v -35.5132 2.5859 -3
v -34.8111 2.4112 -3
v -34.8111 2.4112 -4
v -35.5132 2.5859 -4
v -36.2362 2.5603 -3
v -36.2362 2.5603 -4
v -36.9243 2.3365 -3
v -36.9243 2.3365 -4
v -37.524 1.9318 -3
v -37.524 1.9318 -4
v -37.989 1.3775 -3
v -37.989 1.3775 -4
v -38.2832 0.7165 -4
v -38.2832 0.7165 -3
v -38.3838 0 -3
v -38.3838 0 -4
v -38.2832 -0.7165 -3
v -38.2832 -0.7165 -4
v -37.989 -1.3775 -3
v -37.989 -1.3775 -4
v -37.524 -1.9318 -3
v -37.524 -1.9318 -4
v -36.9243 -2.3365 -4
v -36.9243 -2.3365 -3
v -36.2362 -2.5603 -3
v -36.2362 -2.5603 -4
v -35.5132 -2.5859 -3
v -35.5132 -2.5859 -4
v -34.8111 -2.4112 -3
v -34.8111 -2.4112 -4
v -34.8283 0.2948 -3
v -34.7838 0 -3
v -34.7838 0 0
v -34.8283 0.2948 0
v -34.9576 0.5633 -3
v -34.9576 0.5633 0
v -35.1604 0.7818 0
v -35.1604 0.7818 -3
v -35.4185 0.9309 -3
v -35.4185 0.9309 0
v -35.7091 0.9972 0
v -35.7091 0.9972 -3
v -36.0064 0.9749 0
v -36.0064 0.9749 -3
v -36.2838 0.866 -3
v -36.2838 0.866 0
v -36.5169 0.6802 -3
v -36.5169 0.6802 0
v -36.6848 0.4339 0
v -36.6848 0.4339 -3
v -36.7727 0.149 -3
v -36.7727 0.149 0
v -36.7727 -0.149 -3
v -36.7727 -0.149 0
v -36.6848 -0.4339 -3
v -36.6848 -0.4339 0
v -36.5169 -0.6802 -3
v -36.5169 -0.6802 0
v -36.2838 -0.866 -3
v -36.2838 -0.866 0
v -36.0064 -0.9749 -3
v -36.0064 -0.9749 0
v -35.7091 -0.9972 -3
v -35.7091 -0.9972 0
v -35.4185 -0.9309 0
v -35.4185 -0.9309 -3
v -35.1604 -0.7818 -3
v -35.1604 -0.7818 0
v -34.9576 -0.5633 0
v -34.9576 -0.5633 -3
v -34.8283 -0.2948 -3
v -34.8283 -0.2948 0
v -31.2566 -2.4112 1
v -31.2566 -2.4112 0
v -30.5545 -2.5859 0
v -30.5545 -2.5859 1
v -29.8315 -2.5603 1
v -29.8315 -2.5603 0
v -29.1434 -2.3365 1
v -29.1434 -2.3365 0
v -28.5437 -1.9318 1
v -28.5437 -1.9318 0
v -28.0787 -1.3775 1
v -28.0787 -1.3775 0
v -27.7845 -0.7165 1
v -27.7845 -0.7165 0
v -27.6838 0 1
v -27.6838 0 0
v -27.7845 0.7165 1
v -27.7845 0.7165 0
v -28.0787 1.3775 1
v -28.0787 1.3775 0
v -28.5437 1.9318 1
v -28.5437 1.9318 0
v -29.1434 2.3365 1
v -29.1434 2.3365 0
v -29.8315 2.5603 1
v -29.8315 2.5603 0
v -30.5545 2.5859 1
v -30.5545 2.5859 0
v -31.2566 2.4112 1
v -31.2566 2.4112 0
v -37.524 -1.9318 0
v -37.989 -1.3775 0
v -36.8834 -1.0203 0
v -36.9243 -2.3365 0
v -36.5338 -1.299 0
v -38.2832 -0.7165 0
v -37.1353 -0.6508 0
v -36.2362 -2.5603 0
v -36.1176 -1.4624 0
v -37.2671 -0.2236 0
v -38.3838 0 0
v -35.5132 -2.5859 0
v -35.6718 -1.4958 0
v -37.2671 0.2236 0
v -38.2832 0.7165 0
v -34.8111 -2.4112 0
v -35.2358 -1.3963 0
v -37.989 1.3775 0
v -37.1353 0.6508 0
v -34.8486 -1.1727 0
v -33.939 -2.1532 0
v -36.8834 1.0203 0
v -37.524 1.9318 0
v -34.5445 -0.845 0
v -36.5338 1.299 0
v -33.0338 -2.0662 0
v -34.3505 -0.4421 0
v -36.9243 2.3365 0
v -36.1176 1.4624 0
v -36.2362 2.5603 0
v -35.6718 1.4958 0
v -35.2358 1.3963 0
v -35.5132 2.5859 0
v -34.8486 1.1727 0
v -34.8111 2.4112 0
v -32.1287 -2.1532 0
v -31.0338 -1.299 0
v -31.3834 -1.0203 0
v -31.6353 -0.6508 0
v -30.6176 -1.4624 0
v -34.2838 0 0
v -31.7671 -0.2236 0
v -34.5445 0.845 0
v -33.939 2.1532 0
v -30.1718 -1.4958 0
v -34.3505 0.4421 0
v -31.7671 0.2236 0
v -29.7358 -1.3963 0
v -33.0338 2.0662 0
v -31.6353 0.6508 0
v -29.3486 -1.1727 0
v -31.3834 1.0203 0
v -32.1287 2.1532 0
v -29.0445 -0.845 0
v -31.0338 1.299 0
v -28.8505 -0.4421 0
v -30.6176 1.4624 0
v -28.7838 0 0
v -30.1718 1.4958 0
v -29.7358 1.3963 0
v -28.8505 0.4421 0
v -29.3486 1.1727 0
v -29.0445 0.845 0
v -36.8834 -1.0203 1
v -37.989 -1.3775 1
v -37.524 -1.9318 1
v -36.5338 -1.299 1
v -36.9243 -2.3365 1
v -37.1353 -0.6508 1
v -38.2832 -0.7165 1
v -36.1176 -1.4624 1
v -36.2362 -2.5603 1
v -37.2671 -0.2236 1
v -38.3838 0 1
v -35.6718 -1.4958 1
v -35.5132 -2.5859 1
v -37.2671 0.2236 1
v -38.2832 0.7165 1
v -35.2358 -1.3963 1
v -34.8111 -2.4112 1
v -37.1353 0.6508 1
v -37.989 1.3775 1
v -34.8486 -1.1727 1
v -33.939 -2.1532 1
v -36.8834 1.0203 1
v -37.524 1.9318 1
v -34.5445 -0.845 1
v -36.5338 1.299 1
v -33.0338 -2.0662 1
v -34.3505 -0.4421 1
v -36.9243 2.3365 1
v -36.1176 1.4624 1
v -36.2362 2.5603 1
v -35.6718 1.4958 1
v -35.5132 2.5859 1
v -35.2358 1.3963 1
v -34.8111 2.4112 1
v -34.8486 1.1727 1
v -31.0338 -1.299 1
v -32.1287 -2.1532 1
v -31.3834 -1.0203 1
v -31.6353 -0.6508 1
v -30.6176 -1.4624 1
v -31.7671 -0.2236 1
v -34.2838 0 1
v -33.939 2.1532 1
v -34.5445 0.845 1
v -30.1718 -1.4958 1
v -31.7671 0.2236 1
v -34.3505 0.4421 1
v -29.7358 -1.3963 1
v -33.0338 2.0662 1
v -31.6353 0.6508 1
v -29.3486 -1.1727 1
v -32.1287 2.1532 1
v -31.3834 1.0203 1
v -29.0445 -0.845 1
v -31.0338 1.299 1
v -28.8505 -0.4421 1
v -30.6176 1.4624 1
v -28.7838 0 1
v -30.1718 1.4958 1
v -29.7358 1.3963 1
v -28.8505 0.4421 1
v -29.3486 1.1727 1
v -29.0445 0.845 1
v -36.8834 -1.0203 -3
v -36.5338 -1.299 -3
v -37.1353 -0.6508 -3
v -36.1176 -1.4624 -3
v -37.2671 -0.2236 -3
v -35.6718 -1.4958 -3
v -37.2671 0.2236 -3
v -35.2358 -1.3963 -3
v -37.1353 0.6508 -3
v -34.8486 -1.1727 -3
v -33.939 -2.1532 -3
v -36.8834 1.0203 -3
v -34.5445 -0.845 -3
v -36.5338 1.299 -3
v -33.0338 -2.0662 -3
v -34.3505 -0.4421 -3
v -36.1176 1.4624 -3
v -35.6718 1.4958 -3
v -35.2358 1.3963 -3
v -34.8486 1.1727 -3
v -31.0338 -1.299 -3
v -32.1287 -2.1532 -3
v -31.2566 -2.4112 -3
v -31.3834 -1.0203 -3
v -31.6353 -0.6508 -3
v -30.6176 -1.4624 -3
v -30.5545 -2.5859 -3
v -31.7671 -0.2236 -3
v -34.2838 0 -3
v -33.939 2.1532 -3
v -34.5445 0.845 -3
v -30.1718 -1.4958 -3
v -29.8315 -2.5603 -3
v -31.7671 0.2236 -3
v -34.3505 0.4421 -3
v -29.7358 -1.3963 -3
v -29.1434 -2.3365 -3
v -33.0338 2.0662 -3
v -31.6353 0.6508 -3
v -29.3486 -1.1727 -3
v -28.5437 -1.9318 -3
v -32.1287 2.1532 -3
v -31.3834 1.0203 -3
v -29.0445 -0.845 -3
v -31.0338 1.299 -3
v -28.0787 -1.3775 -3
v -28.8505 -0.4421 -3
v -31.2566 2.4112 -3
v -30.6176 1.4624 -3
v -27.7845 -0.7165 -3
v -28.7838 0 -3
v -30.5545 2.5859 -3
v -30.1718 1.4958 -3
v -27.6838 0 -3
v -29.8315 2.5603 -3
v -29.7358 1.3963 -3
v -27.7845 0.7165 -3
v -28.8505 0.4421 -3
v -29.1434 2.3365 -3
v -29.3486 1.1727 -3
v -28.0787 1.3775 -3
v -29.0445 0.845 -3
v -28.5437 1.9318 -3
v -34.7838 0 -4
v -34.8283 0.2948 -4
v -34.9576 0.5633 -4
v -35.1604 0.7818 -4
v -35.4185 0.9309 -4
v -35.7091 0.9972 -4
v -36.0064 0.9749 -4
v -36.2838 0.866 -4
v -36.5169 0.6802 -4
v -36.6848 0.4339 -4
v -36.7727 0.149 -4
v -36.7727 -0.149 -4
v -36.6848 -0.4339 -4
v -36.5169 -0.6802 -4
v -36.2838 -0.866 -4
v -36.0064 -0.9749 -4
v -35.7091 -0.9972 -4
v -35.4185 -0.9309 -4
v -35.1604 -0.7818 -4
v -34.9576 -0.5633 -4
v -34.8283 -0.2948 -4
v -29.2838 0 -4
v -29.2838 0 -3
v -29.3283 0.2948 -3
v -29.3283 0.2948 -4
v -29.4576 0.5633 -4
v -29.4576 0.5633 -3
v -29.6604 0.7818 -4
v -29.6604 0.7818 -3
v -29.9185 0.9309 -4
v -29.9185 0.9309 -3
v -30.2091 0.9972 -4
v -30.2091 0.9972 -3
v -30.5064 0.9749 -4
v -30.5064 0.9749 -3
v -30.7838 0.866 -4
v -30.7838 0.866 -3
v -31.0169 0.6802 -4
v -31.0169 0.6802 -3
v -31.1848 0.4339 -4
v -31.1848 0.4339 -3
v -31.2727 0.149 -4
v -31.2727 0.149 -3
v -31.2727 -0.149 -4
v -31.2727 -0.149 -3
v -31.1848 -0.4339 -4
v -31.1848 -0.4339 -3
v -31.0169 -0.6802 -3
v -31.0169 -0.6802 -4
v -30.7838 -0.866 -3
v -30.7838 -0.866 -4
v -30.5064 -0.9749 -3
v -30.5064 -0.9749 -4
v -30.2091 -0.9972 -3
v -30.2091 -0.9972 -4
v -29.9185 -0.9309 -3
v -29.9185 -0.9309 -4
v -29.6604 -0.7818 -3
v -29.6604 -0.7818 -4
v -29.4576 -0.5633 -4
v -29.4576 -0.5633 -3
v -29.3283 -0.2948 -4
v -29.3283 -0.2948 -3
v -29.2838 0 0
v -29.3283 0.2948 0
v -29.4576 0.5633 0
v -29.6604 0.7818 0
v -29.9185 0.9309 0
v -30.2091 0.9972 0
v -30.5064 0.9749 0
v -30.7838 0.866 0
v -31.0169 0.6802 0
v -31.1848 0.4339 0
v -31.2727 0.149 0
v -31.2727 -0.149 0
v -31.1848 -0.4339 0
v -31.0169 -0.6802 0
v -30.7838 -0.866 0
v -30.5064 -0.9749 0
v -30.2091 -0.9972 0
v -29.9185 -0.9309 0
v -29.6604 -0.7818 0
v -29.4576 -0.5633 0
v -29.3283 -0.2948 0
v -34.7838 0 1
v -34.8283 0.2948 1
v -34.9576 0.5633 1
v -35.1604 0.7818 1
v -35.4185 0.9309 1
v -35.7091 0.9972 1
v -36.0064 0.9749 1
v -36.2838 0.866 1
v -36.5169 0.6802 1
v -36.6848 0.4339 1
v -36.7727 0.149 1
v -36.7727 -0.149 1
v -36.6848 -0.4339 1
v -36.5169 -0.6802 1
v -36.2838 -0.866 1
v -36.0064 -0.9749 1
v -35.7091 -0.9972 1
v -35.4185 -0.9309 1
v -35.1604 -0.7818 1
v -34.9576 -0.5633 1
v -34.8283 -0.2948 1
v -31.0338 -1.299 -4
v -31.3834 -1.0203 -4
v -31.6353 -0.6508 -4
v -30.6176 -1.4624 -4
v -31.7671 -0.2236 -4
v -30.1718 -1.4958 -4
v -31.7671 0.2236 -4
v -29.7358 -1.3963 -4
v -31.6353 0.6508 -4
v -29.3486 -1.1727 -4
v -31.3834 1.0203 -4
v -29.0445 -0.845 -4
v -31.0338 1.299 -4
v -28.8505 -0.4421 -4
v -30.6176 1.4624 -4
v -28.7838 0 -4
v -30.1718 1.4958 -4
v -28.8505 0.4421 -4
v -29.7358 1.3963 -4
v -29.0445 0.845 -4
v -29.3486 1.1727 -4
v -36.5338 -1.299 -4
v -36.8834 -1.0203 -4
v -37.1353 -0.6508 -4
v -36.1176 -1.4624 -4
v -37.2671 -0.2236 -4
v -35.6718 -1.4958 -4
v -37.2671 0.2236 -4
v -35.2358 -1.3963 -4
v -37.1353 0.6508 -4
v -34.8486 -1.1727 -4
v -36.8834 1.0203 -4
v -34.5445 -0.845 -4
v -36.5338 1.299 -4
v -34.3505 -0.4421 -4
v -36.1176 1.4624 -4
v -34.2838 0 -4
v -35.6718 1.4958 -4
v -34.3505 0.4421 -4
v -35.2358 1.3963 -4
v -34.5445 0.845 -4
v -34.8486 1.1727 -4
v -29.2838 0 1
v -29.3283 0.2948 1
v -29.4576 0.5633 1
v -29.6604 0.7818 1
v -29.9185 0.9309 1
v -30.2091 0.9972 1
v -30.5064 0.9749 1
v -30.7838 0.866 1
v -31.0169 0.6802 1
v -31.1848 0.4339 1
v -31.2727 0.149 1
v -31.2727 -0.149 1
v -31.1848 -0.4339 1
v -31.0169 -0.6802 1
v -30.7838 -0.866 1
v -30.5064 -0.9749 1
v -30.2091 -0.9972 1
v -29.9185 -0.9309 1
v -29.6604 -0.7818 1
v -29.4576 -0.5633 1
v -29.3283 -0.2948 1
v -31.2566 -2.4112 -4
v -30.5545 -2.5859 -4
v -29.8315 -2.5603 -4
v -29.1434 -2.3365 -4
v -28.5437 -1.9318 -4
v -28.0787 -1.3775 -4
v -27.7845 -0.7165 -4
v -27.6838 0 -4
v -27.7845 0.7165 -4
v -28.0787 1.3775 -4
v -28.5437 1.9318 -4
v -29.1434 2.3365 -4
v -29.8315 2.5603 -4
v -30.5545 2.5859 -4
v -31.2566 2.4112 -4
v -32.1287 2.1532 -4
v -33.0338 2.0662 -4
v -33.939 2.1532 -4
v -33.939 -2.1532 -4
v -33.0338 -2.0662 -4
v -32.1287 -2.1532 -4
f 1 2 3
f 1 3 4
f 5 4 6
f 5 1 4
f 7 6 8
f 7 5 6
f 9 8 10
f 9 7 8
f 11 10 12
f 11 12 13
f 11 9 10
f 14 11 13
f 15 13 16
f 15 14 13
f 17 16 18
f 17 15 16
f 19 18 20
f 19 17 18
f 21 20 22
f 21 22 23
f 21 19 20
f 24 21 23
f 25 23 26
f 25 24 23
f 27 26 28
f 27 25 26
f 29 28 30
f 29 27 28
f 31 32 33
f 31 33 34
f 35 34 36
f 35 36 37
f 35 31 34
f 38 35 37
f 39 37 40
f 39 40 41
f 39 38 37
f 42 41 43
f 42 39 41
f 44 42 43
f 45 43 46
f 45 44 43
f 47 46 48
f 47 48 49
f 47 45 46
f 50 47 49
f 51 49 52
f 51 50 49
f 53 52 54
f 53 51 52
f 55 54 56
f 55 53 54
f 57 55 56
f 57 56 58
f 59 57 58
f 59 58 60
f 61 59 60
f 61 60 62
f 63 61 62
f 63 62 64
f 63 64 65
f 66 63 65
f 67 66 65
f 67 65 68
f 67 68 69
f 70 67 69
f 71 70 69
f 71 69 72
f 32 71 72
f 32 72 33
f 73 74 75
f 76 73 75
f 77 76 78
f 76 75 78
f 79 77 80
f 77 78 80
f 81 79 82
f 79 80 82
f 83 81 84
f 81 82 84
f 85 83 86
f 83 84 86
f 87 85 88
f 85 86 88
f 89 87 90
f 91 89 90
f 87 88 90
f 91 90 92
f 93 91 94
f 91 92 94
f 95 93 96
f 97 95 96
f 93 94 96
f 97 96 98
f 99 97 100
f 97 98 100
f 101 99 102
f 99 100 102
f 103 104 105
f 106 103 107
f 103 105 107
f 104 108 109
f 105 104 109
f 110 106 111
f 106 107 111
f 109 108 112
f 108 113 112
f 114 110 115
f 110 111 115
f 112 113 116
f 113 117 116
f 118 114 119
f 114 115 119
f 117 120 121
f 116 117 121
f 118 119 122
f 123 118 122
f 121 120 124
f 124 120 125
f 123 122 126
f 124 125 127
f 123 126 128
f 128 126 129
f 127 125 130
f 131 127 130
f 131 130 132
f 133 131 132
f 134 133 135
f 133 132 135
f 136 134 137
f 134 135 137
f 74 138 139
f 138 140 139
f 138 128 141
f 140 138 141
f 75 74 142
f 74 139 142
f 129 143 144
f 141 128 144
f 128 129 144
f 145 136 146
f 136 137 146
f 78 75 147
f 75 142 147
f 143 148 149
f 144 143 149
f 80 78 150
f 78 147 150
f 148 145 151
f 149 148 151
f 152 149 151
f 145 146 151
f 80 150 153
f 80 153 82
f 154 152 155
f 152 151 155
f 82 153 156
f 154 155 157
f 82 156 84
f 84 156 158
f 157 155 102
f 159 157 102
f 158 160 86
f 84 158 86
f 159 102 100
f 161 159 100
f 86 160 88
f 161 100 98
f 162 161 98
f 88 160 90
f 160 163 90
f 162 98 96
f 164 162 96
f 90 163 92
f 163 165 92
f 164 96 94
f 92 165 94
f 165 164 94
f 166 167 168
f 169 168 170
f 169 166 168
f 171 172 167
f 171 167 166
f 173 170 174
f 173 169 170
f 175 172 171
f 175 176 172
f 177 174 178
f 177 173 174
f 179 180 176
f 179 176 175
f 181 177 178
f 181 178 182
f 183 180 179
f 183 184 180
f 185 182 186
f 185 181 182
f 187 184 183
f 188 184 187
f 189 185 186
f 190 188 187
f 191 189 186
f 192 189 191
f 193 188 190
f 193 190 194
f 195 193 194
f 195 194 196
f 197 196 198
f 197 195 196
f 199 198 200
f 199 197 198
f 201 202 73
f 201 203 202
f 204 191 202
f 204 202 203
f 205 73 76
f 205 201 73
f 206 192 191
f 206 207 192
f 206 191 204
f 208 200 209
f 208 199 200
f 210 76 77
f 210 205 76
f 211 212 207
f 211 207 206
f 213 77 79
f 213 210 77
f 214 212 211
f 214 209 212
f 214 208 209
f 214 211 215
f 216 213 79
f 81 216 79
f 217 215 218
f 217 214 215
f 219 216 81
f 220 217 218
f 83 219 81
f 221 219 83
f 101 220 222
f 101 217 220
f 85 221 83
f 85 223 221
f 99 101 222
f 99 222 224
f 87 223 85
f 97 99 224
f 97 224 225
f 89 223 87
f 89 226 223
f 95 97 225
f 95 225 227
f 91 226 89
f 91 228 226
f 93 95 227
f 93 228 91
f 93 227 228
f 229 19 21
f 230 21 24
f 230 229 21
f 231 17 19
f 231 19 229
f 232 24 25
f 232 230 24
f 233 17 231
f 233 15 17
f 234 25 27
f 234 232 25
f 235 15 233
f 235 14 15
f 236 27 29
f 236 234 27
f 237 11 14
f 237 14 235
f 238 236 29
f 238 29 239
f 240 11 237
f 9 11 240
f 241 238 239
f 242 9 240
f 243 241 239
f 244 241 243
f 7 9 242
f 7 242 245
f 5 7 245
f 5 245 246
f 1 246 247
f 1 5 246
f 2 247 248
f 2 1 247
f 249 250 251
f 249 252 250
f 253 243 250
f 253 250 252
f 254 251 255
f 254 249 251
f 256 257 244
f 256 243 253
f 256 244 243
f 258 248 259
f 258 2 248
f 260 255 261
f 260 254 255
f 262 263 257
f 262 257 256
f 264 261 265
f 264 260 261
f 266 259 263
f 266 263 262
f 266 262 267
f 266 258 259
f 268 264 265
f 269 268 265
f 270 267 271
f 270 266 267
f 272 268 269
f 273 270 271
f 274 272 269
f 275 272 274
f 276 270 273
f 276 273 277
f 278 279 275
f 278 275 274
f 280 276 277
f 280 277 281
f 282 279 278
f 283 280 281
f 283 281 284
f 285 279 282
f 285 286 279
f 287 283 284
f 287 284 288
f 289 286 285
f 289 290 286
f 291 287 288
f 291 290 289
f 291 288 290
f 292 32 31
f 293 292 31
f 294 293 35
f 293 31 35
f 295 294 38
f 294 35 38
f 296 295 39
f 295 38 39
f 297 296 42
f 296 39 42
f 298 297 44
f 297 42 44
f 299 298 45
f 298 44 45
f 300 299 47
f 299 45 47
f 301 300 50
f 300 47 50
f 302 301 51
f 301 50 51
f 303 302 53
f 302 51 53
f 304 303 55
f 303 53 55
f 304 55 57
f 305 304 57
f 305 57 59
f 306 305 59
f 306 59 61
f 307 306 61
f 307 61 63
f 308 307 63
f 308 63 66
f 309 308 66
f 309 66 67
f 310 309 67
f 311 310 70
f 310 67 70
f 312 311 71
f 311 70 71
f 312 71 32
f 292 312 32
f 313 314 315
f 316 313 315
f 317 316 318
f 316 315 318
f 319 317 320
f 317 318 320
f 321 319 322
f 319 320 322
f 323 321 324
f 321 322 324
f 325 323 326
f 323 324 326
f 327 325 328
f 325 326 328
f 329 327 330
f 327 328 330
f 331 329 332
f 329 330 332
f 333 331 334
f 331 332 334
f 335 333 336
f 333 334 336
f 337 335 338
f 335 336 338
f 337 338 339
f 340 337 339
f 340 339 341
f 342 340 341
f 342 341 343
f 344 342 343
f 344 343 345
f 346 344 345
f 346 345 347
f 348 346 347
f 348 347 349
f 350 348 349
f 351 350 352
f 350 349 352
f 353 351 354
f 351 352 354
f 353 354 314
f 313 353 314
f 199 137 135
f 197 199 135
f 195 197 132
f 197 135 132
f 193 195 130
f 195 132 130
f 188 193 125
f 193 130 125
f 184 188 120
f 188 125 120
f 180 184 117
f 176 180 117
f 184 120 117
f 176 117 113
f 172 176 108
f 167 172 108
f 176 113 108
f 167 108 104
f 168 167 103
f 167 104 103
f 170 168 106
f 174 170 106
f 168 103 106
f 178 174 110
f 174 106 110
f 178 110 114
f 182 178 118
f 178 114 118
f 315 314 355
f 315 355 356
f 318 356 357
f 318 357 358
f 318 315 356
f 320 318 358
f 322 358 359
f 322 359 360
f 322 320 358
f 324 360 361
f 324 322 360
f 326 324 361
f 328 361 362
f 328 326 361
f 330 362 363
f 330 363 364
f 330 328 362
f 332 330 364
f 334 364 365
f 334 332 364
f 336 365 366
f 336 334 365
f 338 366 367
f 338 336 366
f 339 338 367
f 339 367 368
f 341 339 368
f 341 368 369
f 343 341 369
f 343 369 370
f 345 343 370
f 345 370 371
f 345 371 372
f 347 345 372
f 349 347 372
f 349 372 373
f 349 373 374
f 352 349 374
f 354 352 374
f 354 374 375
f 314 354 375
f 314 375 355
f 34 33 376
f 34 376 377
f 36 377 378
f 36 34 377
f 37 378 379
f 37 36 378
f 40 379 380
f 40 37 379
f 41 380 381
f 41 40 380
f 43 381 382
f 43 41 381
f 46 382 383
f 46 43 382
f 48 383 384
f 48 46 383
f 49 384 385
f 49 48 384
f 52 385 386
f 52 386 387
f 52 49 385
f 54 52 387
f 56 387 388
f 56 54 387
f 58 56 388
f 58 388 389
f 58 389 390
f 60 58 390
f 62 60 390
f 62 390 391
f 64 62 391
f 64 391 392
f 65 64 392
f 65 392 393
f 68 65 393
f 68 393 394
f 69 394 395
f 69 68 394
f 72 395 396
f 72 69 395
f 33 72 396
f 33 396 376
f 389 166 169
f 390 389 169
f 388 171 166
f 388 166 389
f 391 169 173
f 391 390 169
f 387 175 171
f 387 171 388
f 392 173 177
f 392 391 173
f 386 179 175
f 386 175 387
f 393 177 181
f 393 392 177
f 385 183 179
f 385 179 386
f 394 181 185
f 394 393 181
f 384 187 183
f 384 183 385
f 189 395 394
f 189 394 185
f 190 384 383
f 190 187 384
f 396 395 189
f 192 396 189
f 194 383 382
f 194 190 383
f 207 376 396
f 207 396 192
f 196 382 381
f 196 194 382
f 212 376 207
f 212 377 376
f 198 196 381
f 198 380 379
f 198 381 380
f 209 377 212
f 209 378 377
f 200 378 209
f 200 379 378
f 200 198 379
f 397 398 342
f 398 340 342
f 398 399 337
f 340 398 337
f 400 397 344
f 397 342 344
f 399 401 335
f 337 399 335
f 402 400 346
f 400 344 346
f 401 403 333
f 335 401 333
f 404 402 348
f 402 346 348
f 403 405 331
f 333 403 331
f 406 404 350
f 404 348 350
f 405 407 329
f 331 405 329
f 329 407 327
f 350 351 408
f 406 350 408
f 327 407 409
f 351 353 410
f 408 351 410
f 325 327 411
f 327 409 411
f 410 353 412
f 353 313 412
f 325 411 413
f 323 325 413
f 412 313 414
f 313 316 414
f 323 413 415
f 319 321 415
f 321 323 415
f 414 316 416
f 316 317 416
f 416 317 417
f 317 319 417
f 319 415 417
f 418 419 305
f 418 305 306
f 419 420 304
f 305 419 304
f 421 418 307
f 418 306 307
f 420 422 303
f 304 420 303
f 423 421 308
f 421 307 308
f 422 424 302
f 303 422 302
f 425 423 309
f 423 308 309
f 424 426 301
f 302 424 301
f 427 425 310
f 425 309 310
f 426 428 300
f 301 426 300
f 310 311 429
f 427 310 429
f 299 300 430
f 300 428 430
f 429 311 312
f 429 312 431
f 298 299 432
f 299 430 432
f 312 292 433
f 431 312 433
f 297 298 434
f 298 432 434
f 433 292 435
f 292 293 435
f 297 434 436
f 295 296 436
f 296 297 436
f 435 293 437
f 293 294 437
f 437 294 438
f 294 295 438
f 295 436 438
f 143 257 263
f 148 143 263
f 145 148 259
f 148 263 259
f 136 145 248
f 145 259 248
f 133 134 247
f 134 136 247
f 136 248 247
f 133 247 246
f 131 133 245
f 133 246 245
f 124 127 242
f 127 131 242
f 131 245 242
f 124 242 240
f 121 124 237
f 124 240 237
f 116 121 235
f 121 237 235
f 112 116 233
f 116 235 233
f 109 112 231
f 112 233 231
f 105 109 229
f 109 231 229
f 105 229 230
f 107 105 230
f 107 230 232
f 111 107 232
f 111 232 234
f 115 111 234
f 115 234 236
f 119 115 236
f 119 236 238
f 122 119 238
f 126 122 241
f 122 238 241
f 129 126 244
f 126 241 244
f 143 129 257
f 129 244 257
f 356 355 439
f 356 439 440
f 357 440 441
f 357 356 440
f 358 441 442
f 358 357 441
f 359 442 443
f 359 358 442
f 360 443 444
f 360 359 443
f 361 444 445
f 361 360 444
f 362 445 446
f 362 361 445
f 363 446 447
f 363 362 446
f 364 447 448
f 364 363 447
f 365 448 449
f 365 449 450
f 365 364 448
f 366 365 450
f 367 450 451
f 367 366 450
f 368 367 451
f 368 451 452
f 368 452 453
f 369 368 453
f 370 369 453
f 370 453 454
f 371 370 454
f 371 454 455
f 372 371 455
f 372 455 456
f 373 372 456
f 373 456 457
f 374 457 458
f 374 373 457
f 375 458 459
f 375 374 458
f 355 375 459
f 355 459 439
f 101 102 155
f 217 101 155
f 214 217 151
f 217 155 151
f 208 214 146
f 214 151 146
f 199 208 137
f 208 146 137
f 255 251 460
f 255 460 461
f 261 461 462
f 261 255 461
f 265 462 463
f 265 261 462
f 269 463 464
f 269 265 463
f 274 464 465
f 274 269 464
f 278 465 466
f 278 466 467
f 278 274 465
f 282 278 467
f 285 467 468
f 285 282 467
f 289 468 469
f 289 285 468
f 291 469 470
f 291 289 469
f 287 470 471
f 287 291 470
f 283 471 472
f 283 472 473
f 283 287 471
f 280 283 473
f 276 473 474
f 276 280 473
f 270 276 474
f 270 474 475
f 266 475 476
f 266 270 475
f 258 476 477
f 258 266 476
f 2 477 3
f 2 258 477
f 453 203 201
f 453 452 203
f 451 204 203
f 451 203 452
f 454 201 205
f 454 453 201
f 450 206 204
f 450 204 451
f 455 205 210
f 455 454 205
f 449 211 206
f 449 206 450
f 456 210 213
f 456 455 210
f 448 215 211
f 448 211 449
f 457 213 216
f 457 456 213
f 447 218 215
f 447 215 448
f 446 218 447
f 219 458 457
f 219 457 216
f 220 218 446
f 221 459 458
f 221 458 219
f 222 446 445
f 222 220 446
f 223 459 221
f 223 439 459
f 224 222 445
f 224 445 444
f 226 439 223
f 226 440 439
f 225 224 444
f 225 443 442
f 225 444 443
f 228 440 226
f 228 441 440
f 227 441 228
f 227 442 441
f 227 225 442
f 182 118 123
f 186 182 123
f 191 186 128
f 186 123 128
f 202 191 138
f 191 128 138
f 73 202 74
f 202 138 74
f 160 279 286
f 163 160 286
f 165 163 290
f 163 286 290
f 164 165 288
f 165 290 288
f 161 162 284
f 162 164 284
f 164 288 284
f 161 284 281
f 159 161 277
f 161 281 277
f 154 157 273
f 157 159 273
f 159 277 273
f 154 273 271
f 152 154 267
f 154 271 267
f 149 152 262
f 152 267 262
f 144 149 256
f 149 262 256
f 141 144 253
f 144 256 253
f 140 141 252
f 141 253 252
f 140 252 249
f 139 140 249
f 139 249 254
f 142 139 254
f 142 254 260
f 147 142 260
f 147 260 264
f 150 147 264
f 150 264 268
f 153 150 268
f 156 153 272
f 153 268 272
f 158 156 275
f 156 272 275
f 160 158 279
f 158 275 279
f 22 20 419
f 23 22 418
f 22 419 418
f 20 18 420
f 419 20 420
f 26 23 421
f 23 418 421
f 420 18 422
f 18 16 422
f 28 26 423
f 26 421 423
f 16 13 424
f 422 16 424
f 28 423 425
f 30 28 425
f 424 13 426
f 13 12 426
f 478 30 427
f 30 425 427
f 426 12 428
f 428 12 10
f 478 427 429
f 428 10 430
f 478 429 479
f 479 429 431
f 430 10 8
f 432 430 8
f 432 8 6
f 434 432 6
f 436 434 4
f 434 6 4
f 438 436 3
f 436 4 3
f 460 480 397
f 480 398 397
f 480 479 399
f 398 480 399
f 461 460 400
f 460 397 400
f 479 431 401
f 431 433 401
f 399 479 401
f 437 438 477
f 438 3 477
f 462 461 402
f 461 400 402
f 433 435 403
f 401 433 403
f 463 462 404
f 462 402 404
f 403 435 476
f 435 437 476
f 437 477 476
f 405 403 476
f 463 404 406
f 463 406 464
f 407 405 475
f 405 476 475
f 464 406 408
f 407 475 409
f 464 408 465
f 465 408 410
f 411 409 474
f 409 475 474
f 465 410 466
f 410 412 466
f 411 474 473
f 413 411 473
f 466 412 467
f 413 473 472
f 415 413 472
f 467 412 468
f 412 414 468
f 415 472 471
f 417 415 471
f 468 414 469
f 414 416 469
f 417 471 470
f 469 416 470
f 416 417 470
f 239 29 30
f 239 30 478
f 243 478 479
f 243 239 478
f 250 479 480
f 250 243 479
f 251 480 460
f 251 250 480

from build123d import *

# Parameters (mm, degrees)
SKETCH1_R           = 1
BOSS_EXTRUDE1_DEPTH = 1
BOSS_EXTRUDE2_START = -5
SKETCH2_R           = 1.5
SKETCH2_R_2         = 1
BOSS_EXTRUDE2_DEPTH = 5


with BuildPart() as part:
    # Sketch1 → Boss-Extrude1 (new body)
    with BuildSketch(Plane.XY):
        with BuildLine():
            ThreePointArc((-34.811060782, 2.411157676), (-38.383849898, 0), (-34.811060782, -2.411157676))
            ThreePointArc((-34.811060782, -2.411157676), (-33.033849898, -2.066157275), (-31.256639013, -2.411157676))
            ThreePointArc((-31.256639013, -2.411157676), (-27.683849898, 0), (-31.256639013, 2.411157676))
            ThreePointArc((-31.256639013, 2.411157676), (-33.033849898, 2.066157275), (-34.811060782, 2.411157676))
        make_face()
        with Locations((-35.783849898, 0)):
            Circle(SKETCH1_R, mode=Mode.SUBTRACT)
        with Locations((-30.283849898, 0)):
            Circle(SKETCH1_R, mode=Mode.SUBTRACT)
    extrude(amount=BOSS_EXTRUDE1_DEPTH)


with BuildPart() as body_2:
    # Mirror2: mirrored copy
    add(part.part.mirror(Plane(origin=(0, 0, -1.5), x_dir=(1, 0, 0), z_dir=(0, 0, -1))))


with BuildPart() as part_1:
    add(part.part)

    add(body_2.part)  # Boss-Extrude2 merges body 2
    # Sketch2 → Boss-Extrude2 (add)
    # profile 1 of 2: a face of its own
    with BuildSketch(Plane.XY.offset(1).offset(BOSS_EXTRUDE2_START)):
        with Locations((-30.283849898, 0)):
            Circle(SKETCH2_R)
        with Locations((-30.283849898, 0)):
            Circle(SKETCH2_R_2, mode=Mode.SUBTRACT)
    # profile 2 of 2: a face of its own
    with BuildSketch(Plane.XY.offset(1).offset(BOSS_EXTRUDE2_START)):
        with Locations((-35.783849898, 0)):
            Circle(SKETCH2_R)
        with Locations((-35.783849898, 0)):
            Circle(SKETCH2_R_2, mode=Mode.SUBTRACT)
    extrude(amount=BOSS_EXTRUDE2_DEPTH)


solid = part_1.part
